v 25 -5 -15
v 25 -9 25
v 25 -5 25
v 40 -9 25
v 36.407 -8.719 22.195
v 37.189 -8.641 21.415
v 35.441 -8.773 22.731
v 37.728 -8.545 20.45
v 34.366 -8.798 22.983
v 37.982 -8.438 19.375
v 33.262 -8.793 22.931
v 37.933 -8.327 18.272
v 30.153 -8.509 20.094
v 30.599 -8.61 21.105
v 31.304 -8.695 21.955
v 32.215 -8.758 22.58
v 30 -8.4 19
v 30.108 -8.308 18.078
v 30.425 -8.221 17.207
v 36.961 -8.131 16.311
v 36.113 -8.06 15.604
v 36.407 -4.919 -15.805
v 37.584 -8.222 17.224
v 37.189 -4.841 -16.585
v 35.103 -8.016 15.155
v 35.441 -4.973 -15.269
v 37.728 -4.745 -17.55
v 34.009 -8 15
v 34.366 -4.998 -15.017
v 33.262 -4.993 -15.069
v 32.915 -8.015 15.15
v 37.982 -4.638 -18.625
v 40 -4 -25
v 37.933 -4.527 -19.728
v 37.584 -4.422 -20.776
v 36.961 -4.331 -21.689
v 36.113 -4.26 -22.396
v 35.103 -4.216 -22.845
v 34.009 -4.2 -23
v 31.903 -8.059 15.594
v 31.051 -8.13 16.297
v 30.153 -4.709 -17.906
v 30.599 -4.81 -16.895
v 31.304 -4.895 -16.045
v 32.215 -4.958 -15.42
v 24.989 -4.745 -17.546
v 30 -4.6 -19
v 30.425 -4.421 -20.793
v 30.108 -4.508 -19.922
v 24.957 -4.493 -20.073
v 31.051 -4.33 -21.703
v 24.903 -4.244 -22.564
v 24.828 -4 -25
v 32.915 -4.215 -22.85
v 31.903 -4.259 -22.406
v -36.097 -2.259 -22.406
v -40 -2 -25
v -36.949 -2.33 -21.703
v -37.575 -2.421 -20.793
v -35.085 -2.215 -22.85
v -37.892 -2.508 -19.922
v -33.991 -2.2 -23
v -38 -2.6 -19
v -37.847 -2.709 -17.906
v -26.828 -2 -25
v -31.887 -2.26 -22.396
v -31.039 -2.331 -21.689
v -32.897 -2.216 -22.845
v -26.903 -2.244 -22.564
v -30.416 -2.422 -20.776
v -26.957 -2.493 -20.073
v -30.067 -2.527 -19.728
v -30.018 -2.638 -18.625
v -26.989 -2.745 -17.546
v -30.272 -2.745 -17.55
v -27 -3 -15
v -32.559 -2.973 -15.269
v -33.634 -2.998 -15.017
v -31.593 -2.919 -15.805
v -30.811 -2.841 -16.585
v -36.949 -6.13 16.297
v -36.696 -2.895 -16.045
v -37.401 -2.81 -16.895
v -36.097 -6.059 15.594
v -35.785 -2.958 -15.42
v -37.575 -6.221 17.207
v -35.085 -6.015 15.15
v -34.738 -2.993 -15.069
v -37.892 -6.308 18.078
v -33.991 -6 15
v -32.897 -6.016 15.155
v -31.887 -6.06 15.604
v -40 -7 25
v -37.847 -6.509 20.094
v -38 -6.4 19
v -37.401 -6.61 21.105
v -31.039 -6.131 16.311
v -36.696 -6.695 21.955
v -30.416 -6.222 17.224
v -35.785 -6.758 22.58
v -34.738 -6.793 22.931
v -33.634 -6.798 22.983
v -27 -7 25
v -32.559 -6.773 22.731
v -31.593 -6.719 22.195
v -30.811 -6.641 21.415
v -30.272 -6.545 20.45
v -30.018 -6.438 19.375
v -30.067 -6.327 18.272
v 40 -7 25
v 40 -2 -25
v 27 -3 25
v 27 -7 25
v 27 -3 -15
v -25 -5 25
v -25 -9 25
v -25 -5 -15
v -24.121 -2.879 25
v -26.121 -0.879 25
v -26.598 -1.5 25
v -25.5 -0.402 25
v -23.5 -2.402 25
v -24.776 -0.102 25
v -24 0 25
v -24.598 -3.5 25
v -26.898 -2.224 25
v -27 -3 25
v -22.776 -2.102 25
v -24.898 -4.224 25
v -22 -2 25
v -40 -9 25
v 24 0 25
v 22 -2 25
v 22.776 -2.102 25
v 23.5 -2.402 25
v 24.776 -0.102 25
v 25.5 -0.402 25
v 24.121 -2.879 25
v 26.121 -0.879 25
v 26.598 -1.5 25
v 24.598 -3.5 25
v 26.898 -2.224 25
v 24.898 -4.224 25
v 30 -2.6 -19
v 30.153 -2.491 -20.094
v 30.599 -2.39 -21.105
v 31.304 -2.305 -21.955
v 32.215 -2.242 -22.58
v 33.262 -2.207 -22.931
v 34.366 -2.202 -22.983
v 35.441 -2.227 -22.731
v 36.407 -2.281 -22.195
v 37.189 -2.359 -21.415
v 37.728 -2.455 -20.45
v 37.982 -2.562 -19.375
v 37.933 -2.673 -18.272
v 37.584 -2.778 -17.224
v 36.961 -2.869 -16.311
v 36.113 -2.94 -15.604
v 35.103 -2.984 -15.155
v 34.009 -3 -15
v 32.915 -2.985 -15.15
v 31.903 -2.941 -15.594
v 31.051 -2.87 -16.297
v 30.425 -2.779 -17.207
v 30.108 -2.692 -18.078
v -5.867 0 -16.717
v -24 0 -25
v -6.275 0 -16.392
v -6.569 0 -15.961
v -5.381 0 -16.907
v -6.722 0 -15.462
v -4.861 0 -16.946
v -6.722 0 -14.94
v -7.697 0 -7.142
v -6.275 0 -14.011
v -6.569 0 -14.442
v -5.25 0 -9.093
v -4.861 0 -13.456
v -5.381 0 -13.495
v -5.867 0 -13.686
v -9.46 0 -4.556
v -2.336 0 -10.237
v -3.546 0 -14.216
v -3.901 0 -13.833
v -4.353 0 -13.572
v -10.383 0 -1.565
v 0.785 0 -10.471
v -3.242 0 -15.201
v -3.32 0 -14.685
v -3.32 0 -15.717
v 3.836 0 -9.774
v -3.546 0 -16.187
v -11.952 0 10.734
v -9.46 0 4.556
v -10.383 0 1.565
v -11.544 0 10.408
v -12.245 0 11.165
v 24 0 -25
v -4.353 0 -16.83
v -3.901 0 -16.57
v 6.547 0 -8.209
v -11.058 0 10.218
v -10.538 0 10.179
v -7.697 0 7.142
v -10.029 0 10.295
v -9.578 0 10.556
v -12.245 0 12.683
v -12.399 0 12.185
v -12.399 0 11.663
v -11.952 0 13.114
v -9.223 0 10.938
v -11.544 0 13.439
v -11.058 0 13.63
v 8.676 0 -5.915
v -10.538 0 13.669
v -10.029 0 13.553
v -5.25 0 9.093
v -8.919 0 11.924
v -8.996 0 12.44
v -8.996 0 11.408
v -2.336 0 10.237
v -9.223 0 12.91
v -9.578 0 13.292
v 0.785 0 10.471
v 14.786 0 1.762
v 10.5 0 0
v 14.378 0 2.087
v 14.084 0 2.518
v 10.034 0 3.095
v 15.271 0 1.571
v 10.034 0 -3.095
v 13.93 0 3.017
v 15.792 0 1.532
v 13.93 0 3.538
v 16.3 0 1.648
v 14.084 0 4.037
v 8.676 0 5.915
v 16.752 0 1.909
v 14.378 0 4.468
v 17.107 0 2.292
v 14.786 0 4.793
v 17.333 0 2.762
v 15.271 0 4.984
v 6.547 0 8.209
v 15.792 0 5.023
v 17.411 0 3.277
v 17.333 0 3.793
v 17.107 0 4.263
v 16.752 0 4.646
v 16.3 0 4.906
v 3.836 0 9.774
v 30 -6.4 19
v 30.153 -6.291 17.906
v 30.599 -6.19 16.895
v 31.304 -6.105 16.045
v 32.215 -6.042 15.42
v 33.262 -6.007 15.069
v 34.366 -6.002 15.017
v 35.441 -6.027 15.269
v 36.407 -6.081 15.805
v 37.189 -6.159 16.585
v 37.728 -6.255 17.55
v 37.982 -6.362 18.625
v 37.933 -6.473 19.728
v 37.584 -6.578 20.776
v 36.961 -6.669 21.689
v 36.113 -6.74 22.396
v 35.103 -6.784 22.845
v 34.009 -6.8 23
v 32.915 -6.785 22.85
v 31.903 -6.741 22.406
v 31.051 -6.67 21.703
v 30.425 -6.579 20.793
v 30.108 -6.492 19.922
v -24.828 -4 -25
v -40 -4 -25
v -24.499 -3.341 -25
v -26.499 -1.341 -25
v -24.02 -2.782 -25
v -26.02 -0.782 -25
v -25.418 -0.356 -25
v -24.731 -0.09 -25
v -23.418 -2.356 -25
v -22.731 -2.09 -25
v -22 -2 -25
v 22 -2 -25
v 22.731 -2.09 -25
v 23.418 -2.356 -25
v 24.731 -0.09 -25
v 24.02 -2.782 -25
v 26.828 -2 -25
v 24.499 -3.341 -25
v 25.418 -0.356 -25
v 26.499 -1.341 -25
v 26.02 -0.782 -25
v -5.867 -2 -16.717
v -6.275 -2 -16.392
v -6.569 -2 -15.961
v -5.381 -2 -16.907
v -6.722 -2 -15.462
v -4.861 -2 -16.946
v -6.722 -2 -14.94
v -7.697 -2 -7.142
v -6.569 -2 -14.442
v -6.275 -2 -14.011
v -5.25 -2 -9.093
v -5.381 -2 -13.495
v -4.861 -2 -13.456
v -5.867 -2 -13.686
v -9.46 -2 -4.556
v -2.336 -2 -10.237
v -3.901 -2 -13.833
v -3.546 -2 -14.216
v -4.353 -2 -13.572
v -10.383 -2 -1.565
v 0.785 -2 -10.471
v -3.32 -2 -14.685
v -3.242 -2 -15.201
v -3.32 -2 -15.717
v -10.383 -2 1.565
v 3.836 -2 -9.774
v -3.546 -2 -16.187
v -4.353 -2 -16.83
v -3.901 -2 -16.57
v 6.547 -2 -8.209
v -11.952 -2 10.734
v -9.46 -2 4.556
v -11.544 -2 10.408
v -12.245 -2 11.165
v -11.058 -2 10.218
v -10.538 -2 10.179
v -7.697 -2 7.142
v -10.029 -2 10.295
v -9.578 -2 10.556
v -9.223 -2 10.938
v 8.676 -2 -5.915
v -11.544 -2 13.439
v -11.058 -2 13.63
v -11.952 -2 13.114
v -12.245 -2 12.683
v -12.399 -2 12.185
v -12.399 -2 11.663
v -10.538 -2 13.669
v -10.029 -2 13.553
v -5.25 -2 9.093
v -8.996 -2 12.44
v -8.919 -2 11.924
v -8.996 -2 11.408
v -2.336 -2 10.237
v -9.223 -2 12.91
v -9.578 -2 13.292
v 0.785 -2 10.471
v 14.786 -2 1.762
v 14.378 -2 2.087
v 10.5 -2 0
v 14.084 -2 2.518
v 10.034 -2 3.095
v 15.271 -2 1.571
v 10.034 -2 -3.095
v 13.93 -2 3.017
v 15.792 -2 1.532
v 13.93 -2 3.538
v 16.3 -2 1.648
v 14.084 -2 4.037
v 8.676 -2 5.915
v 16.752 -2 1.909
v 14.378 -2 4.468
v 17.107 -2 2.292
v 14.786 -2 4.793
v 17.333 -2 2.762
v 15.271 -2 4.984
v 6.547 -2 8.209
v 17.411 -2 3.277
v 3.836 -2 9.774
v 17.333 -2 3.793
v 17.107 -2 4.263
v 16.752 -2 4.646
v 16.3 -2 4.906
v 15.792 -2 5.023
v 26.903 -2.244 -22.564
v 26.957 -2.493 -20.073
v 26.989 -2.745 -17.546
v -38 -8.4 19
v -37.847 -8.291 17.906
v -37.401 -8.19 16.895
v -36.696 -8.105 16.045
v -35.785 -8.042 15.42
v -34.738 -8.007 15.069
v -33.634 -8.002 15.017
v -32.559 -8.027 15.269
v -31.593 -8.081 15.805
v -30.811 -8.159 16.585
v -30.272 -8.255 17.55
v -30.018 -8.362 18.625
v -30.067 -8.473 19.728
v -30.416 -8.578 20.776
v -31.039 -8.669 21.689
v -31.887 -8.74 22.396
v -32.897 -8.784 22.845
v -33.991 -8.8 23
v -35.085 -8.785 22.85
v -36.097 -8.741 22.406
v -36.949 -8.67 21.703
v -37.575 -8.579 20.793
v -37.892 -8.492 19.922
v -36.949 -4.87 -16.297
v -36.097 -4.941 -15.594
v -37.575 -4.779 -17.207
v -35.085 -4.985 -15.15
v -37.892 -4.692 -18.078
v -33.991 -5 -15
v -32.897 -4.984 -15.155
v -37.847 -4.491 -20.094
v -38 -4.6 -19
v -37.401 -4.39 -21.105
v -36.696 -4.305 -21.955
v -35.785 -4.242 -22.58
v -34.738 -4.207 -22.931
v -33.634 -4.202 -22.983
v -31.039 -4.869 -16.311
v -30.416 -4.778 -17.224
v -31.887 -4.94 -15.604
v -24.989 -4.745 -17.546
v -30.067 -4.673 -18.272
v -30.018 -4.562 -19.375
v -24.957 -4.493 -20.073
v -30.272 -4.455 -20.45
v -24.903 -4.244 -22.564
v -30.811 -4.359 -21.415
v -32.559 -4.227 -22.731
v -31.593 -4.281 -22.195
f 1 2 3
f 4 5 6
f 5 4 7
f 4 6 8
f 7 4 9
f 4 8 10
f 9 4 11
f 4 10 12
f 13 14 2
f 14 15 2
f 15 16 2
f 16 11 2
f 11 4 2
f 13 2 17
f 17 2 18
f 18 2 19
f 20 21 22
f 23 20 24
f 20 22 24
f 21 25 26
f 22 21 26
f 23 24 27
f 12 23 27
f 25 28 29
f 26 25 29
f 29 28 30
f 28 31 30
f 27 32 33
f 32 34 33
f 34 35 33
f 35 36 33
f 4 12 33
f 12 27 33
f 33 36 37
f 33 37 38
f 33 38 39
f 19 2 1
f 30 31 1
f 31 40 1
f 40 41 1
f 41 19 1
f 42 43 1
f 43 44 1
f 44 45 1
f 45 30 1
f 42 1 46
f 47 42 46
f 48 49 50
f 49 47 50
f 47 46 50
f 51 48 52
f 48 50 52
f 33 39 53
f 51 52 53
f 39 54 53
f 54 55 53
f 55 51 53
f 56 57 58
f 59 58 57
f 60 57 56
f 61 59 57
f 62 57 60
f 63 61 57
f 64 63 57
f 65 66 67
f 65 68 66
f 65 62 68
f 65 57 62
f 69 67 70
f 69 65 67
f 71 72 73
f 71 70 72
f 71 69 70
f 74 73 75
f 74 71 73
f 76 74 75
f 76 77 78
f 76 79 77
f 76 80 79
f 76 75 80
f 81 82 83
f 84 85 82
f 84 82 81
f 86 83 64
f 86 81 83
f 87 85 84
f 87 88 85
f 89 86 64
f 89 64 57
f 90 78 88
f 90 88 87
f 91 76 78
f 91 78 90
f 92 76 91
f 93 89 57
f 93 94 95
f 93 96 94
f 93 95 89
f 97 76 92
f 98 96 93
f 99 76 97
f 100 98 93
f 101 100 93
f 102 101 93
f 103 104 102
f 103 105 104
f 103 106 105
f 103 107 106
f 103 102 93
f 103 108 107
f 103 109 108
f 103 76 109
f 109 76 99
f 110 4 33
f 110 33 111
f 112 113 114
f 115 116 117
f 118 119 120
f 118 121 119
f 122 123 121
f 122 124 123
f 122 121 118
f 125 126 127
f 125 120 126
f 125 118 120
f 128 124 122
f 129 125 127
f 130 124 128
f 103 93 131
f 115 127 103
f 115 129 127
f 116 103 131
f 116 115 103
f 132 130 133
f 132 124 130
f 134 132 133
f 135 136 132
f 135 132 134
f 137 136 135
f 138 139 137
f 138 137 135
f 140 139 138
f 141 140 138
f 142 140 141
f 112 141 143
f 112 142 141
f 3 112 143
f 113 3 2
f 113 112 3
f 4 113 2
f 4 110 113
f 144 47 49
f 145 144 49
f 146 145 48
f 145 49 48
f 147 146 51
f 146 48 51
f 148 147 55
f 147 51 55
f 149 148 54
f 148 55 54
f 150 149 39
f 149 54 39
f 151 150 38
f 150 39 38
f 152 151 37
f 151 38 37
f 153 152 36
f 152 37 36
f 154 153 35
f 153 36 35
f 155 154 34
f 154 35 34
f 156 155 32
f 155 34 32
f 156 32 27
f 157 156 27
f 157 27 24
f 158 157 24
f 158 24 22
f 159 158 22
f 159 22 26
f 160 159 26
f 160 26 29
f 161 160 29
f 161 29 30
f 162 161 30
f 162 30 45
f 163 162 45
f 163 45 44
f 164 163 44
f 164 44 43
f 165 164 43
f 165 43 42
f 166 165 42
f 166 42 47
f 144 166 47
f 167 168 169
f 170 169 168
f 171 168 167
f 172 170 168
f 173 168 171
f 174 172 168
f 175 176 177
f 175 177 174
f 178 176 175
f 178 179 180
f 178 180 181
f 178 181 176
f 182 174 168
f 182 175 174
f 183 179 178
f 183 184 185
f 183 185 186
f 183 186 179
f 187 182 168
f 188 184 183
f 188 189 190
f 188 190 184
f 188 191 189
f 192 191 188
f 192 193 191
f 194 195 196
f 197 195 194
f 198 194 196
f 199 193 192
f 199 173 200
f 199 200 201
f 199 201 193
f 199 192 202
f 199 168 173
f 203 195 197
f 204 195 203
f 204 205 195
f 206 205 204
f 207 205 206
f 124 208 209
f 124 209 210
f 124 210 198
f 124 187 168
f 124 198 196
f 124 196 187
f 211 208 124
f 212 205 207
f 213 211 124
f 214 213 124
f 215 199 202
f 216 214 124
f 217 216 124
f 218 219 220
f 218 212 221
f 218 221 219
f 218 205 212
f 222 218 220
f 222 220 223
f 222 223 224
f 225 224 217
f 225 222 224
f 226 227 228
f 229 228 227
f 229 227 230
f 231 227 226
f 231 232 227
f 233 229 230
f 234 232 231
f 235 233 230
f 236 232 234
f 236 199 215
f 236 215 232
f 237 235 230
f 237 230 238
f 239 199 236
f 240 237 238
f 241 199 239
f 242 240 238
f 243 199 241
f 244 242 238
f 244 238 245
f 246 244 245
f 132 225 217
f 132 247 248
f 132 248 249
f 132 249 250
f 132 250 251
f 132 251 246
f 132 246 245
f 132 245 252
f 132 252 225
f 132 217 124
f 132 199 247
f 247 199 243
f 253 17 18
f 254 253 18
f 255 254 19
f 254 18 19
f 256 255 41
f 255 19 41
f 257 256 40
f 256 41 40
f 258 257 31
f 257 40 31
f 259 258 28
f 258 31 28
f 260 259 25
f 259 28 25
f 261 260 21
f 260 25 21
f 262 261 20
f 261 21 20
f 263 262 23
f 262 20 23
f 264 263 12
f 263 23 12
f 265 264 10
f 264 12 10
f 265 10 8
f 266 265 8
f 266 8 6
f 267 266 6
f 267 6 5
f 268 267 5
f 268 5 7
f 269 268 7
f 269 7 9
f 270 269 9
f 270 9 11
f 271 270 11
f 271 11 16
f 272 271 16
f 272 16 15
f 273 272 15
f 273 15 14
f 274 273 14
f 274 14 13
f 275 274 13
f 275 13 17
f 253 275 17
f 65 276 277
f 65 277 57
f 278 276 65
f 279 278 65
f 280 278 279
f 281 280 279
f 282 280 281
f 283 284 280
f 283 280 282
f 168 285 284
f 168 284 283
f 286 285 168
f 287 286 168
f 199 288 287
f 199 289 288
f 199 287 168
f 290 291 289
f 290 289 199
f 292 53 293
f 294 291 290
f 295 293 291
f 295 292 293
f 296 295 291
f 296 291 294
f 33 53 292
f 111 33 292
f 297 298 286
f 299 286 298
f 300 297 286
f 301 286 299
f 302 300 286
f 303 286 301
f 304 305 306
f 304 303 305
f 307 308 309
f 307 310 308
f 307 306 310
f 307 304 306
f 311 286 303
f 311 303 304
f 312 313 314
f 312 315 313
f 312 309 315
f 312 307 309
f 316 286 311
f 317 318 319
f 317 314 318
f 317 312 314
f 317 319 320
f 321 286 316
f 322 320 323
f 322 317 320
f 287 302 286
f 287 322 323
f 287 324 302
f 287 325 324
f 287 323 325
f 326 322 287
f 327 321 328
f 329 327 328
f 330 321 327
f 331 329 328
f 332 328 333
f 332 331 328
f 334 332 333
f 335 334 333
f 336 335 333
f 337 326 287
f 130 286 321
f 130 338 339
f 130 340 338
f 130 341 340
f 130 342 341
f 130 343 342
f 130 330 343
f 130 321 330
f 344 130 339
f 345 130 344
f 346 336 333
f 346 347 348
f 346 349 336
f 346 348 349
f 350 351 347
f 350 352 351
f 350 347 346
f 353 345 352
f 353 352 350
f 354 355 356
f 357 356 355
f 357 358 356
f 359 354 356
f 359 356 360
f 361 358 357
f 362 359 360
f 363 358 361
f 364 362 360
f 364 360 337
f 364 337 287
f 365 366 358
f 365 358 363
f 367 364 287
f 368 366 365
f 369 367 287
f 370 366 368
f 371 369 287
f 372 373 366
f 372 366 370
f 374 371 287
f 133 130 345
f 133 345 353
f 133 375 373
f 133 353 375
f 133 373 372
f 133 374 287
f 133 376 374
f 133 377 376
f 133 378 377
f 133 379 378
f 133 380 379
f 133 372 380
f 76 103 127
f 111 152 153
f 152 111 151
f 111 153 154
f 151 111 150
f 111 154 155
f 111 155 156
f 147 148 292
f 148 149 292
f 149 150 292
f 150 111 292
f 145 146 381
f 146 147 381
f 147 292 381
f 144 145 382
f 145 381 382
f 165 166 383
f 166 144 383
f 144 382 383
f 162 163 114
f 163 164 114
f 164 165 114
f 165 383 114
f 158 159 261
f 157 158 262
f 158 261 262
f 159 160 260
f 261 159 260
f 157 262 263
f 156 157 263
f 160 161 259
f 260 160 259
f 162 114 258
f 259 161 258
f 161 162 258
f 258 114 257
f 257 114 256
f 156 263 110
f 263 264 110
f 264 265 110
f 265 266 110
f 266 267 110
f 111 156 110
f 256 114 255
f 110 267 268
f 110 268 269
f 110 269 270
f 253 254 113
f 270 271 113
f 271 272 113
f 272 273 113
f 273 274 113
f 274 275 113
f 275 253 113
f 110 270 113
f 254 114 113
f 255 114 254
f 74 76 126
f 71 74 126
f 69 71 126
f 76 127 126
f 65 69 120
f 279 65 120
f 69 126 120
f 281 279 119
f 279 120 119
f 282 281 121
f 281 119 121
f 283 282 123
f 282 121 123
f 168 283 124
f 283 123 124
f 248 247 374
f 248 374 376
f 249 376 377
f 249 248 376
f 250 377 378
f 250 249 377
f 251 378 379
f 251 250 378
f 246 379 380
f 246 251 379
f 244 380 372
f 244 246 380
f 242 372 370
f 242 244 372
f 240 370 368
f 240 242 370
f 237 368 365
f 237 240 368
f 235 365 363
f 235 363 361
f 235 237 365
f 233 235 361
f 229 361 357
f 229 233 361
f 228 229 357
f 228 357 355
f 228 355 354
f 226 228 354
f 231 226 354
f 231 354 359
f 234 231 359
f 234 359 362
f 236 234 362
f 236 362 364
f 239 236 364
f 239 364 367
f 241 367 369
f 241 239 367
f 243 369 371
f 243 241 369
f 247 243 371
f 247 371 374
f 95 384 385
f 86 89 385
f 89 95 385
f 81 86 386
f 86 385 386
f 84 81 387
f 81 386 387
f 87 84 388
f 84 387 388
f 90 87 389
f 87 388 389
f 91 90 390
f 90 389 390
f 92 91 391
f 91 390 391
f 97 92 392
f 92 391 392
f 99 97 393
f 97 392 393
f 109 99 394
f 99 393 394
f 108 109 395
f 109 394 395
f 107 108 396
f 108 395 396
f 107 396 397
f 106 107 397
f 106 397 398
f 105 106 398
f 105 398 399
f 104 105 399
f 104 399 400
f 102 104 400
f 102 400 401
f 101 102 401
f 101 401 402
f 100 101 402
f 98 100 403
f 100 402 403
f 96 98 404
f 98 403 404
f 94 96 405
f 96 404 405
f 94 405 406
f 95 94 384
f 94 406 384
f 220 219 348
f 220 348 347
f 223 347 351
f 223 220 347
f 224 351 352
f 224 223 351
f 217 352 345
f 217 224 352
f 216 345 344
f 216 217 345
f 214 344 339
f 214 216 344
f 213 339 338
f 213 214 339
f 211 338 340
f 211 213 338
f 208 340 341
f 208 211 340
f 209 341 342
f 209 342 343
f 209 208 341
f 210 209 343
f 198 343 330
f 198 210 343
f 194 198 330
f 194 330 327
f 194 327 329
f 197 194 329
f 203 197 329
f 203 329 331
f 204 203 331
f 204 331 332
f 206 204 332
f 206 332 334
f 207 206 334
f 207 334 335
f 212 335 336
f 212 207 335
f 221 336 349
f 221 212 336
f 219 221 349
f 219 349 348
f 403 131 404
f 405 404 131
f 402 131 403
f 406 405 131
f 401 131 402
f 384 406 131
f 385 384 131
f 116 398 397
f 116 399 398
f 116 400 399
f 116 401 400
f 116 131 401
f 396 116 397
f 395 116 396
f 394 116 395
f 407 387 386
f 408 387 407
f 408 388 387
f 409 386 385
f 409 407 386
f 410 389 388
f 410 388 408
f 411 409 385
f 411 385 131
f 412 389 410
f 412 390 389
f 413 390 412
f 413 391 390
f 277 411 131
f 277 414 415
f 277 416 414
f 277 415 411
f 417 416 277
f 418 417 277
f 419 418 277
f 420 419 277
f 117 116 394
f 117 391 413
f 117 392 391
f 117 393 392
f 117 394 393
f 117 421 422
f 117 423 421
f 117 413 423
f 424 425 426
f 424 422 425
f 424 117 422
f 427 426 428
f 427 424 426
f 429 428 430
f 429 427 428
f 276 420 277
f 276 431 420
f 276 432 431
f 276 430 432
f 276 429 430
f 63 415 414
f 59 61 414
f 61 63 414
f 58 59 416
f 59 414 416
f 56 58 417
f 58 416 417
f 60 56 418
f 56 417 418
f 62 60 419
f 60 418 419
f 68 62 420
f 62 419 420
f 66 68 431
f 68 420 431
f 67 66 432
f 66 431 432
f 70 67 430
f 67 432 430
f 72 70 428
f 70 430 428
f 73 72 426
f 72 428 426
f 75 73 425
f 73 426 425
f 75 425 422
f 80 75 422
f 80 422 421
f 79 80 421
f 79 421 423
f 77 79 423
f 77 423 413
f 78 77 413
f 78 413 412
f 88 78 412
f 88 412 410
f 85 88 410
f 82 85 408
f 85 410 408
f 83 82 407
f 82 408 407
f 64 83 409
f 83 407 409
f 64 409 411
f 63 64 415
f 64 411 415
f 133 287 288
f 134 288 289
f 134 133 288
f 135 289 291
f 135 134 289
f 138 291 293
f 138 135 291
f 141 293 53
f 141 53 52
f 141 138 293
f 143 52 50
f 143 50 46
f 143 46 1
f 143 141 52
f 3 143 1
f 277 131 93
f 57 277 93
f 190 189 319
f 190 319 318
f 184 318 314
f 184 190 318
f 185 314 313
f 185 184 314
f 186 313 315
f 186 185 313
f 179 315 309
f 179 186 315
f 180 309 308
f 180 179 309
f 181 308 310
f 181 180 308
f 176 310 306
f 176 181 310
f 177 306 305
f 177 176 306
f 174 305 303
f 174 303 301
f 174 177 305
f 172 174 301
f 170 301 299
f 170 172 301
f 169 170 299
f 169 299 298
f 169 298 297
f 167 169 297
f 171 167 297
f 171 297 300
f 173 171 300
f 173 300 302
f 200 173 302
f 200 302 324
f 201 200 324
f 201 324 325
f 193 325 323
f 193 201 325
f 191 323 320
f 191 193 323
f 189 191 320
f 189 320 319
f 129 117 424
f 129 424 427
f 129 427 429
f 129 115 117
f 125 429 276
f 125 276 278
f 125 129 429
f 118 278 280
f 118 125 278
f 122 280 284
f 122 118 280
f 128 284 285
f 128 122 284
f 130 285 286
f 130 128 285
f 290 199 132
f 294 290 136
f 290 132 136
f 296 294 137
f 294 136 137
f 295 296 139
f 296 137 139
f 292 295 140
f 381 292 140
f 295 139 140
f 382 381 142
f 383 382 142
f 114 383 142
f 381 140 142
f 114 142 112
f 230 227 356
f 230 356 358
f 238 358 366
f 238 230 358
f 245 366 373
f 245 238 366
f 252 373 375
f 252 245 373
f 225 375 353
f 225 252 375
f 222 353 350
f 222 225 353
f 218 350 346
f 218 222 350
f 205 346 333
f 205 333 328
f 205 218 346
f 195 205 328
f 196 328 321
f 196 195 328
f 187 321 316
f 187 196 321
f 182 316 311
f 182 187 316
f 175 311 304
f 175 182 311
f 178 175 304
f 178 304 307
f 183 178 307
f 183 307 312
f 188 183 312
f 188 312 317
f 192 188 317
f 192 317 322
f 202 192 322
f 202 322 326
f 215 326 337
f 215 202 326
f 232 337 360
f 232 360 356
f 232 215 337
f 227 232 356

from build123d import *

# Parameters (mm, degrees)
F0_W     = 50
F0_H     = 50
F0_R     = 1.75
F0_R_2   = 10.5
F1_DEPTH = 2
F3_START = 25
F3_DEPTH = 2
F5_START = -25
F5_DEPTH = 2
F7_START = 25
F7_DEPTH = 15
F8_START = -25
F8_DEPTH = 15
F10_D    = 8
F11_R    = 3


with BuildPart() as f1:
    # F0 (on Front) → F1 (new body)
    with BuildSketch(Plane.XZ):
        Rectangle(F0_W, F0_H)
        with Locations((-4.9920080166, -15.2013109949)):
            Circle(F0_R, mode=Mode.SUBTRACT)
        with Locations((-10.6687174841, 11.9238612557)):
            Circle(F0_R, mode=Mode.SUBTRACT)
        Circle(F0_R_2, mode=Mode.SUBTRACT)
        with Locations((15.6607255007, 3.2774497392)):
            Circle(F0_R, mode=Mode.SUBTRACT)
    extrude(amount=F1_DEPTH)

    # F2 (on Right) → F3 (join)
    with BuildSketch(Plane.YZ.offset(F3_START)):
        Polygon((0, 25), (-2, 25), (-7, 25), (-2, -25), (0, -25), align=None)
    extrude(amount=F3_DEPTH)

    # F4 (on Right) → F5 (join)
    with BuildSketch(Plane.YZ.offset(F5_START)):
        Polygon((0, -25), (0, 25), (-2, 25), (-7, 25), (-2, -25), align=None)
    extrude(amount=-F5_DEPTH)

    # F6 (on Right) → F7 (join)
    with BuildSketch(Plane.YZ.offset(F7_START)):
        Polygon((-2, -25), (-7, 25), (-9, 25), (-4, -25), align=None)
    extrude(amount=F7_DEPTH)

    # F6 (on Right) → F8 (join)
    with BuildSketch(Plane.YZ.offset(F8_START)):
        Polygon((-2, -25), (-7, 25), (-9, 25), (-4, -25), align=None)
    extrude(amount=-F8_DEPTH)

    # F10 (through all)
    with Locations(Plane(origin=(0, 0, 0), x_dir=(1, 0, 0), z_dir=(0, 1, 0))):
        with Locations((-34, -19), (-34, 19), (34, 19), (34, -19)):
            Hole(F10_D / 2)

    # F11
    f11_edges = [f1.edges().sort_by_distance(p)[0] for p in [
        (-27, 0, 0),
        (27, 0, 0),
        (25, -2, 0),
        (-25, -2, 0),
    ]]
    fillet(f11_edges, radius=F11_R)


solid = f1.part
